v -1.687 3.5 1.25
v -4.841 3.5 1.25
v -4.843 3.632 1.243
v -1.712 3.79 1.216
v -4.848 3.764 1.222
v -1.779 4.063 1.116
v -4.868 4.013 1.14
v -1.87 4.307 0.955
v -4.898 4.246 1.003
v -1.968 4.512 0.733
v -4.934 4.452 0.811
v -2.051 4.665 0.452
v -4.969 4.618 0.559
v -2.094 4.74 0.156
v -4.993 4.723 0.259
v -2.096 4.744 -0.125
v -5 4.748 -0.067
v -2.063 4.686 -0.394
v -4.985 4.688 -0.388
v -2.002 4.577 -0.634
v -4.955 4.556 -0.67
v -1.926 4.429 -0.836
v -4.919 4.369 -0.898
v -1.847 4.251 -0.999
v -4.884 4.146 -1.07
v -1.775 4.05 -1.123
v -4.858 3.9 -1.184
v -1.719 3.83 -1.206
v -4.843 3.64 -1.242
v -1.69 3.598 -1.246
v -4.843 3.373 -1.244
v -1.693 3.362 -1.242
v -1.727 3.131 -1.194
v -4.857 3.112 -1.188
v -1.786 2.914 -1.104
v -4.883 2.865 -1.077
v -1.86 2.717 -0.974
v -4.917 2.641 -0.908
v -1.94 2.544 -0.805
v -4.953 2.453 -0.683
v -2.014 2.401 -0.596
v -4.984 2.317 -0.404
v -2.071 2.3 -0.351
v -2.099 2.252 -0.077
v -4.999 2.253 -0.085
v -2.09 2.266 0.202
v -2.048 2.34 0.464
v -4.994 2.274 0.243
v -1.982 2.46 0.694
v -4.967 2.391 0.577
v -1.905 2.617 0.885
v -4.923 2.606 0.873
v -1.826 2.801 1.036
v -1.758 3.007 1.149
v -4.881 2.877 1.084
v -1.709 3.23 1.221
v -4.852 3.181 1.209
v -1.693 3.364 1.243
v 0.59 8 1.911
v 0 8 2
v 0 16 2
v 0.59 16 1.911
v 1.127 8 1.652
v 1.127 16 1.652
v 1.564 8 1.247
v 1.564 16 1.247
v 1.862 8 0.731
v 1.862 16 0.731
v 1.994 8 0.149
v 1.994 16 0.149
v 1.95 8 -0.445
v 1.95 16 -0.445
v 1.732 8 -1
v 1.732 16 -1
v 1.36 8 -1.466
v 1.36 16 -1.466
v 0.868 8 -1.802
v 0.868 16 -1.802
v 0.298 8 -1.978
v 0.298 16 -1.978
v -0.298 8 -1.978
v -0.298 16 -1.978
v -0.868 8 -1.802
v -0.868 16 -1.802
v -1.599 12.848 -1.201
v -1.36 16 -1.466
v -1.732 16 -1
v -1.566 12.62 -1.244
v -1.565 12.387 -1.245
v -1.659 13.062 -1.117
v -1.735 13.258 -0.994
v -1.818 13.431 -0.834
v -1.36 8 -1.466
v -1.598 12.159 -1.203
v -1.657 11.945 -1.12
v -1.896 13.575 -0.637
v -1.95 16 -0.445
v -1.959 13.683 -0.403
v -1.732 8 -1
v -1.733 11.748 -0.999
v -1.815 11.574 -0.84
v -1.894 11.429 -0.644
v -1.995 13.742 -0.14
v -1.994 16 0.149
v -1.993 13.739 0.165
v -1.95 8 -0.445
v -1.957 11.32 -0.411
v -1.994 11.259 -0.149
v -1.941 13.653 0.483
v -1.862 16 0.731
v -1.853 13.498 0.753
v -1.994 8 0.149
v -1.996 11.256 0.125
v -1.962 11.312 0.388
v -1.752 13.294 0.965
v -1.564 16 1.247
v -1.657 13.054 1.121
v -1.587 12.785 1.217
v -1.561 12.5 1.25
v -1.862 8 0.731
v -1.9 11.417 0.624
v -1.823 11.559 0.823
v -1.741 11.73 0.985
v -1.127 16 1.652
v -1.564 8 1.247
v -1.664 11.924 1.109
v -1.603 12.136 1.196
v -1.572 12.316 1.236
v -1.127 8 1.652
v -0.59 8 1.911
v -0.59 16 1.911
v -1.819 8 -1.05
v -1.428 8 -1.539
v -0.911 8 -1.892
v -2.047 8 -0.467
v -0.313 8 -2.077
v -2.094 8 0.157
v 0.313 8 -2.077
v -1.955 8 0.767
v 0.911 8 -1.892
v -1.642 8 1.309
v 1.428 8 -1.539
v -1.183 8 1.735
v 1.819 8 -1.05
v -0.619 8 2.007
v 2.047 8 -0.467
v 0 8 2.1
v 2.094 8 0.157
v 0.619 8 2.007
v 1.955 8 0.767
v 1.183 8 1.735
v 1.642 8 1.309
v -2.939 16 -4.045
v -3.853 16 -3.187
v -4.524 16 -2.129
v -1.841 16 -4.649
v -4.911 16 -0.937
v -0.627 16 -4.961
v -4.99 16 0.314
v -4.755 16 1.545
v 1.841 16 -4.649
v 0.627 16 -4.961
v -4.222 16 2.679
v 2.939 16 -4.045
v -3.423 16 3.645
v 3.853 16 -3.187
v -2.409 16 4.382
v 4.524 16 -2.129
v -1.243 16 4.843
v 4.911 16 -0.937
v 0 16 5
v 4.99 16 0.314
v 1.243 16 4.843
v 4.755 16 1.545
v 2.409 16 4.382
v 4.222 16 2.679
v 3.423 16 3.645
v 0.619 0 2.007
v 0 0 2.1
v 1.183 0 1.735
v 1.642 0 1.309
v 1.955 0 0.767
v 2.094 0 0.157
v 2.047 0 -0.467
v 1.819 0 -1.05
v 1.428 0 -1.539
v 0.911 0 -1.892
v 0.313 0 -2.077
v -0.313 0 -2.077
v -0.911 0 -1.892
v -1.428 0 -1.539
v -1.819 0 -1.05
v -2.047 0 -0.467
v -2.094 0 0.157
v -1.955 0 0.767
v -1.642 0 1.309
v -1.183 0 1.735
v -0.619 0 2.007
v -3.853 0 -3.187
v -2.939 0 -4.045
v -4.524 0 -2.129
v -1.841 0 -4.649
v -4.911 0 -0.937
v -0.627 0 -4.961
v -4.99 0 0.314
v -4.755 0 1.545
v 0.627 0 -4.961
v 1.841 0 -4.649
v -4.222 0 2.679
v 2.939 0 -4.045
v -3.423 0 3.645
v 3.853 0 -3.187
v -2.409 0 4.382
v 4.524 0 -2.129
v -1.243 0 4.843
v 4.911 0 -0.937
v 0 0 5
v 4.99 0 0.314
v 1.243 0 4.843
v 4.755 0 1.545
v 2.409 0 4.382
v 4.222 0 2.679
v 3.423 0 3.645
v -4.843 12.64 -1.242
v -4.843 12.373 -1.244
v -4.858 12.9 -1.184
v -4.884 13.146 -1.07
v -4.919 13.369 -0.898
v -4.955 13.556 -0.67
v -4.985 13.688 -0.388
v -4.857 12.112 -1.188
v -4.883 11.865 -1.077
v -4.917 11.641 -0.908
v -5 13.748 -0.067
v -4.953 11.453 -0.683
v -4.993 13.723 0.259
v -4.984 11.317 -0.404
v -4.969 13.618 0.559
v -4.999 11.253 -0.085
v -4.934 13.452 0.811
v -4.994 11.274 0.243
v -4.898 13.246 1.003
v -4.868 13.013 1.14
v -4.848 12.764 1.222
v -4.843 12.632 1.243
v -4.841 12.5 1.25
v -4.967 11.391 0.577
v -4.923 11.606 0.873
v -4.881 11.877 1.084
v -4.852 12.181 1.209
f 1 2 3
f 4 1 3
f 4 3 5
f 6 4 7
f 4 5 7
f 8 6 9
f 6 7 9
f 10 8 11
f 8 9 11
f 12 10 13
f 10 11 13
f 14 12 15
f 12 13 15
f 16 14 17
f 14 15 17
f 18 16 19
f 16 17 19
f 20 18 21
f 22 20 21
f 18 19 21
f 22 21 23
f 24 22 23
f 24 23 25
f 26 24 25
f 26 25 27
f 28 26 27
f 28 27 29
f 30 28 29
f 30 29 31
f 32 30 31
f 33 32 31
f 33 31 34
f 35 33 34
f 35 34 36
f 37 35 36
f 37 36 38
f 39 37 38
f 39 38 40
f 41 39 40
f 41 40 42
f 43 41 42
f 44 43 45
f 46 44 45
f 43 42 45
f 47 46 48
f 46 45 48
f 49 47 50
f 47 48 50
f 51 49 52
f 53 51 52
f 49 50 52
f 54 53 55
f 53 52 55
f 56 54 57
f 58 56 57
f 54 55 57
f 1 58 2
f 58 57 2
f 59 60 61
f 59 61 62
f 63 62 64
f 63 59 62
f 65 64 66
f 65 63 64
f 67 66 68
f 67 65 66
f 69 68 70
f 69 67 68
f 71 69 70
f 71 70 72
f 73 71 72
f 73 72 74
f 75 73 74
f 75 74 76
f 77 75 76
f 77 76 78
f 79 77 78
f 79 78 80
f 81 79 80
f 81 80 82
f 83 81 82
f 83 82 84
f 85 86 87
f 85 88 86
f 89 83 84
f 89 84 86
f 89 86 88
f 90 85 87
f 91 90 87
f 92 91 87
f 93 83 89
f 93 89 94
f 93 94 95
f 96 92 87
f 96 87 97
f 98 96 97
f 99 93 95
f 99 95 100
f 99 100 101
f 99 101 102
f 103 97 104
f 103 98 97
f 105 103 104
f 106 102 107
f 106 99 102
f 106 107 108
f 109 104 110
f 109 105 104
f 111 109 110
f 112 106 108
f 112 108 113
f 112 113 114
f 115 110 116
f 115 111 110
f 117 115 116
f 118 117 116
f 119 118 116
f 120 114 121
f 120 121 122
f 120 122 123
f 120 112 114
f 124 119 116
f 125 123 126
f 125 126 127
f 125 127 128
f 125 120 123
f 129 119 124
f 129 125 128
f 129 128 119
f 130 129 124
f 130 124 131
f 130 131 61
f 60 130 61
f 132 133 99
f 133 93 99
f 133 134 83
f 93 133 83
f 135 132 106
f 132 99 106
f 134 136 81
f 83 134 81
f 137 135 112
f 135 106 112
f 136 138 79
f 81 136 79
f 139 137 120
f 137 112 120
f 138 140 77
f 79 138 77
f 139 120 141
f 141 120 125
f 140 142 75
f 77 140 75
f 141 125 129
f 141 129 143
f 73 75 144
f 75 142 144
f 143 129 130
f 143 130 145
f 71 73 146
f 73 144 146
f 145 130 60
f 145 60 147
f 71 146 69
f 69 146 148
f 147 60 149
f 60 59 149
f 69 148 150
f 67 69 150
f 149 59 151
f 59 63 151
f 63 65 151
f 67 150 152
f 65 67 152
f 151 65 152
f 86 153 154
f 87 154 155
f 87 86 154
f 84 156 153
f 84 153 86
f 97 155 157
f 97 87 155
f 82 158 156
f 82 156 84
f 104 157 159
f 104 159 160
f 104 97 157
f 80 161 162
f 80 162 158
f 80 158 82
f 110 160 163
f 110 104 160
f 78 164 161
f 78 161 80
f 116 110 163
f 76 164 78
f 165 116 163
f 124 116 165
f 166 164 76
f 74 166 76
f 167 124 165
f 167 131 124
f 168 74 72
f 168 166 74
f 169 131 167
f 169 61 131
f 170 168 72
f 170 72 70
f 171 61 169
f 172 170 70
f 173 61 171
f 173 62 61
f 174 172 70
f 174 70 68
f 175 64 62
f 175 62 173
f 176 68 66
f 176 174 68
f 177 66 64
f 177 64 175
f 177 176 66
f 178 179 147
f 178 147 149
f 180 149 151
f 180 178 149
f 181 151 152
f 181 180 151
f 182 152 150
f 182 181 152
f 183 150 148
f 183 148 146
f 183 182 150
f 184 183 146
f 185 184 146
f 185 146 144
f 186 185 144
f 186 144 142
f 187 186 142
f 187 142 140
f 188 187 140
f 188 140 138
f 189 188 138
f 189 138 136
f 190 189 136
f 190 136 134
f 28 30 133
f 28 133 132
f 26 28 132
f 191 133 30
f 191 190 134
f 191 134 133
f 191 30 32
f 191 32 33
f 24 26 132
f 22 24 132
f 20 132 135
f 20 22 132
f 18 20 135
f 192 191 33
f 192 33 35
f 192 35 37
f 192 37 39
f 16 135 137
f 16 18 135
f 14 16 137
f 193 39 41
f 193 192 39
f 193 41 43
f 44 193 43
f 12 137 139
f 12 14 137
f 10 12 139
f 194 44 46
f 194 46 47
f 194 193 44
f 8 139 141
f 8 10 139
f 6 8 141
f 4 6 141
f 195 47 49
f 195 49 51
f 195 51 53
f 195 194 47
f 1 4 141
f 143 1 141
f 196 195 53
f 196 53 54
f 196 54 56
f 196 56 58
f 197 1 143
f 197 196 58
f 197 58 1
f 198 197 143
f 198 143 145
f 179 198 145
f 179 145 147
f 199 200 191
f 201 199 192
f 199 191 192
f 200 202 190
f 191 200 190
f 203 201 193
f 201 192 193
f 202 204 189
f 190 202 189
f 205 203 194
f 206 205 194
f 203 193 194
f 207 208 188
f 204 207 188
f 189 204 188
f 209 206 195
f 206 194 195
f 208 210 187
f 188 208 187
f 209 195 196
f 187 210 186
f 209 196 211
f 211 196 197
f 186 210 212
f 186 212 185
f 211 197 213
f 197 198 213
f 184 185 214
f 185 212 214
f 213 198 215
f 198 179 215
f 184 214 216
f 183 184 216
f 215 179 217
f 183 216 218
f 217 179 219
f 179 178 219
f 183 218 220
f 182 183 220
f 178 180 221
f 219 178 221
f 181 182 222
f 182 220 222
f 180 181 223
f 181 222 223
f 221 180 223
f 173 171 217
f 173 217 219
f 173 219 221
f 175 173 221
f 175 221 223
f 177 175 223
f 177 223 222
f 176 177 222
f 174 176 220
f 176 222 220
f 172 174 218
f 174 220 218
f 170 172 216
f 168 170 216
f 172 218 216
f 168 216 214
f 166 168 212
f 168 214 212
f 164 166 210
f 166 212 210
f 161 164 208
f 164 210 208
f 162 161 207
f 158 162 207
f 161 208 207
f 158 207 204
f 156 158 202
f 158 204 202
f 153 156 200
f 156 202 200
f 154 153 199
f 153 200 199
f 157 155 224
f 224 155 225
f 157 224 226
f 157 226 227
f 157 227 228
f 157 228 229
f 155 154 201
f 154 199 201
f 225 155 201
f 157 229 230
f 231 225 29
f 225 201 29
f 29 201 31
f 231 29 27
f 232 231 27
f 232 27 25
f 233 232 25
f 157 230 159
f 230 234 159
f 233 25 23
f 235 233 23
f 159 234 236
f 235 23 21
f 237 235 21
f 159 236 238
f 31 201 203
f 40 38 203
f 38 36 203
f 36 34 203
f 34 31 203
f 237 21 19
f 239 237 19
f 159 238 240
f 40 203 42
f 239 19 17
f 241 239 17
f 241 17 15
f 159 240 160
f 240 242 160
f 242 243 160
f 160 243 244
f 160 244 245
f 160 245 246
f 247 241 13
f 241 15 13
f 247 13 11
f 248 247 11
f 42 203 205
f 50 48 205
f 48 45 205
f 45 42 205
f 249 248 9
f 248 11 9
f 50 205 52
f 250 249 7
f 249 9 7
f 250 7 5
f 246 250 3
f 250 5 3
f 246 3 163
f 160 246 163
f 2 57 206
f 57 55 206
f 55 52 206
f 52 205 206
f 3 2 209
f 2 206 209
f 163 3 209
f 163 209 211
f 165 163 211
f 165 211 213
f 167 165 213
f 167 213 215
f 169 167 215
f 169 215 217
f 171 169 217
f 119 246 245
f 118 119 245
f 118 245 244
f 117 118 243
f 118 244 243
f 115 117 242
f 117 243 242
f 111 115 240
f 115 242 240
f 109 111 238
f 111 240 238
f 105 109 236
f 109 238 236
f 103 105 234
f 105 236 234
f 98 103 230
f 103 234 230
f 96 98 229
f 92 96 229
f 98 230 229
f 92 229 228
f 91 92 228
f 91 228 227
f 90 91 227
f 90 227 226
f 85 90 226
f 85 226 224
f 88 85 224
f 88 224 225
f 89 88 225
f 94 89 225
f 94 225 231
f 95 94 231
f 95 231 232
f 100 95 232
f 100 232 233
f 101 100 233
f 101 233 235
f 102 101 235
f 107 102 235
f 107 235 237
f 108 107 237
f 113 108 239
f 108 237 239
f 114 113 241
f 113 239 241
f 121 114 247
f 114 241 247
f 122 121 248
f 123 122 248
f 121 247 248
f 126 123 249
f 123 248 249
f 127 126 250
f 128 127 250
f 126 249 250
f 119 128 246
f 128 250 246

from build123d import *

# Parameters (mm, degrees)
SKETCH1_R              = 5
SKETCH1_R_2            = 2.1
BOSS_EXTRUDE1_DEPTH    = 8
SKETCH2_R              = 5
SKETCH2_R_2            = 2
BOSS_EXTRUDE2_DEPTH    = 8
M3_TAPPED_HOLE2_REACH  = 21.519
M3_TAPPED_HOLE2_BORE_R = 1.25


with BuildPart() as part:
    # Sketch1 → Boss-Extrude1 (new body)
    with BuildSketch(Plane(origin=(0, 0, 0), x_dir=(1, 0, 0), z_dir=(0, 1, 0))):
        with Locations(Location((0, 0, 0), (0, 0, 270))):
            Circle(SKETCH1_R)
        with Locations(Location((0, 0, 0), (0, 0, 270))):
            Circle(SKETCH1_R_2, mode=Mode.SUBTRACT)
    extrude(amount=BOSS_EXTRUDE1_DEPTH)

    # Sketch2 → Boss-Extrude2 (add)
    with BuildSketch(Plane(origin=(0, 8, 0), x_dir=(1, 0, 0), z_dir=(0, 1, 0))):
        with Locations(Location((0, 0, 0), (0, 0, 270))):
            Circle(SKETCH2_R)
        with Locations(Location((0, 0, 0), (0, 0, 270))):
            Circle(SKETCH2_R_2, mode=Mode.SUBTRACT)
    extrude(amount=BOSS_EXTRUDE2_DEPTH)

    # M3 Tapped Hole2 bore → M3 Tapped Hole2 (cut, up to next)
    with BuildSketch(Plane.ZY.offset(5), mode=Mode.PRIVATE) as m3_tapped_hole2_sk1:
        with Locations((0, 12.5)):
            Circle(M3_TAPPED_HOLE2_BORE_R)
    m3_tapped_hole2_tool1 = extrude(m3_tapped_hole2_sk1.sketch, amount=-M3_TAPPED_HOLE2_REACH, mode=Mode.PRIVATE) & part.part
    # M3 Tapped Hole2 bore → M3 Tapped Hole2 (cut, up to next)
    with BuildSketch(Plane.ZY.offset(5), mode=Mode.PRIVATE) as m3_tapped_hole2_sk2:
        with Locations((0, 3.5)):
            Circle(M3_TAPPED_HOLE2_BORE_R)
    m3_tapped_hole2_tool2 = extrude(m3_tapped_hole2_sk2.sketch, amount=-M3_TAPPED_HOLE2_REACH, mode=Mode.PRIVATE) & part.part
    add(m3_tapped_hole2_tool1.solids().sort_by_distance((-5, 12.5, 0))[0], mode=Mode.SUBTRACT)
    add(m3_tapped_hole2_tool2.solids().sort_by_distance((-5, 3.5, 0))[0], mode=Mode.SUBTRACT)


solid = part.part
